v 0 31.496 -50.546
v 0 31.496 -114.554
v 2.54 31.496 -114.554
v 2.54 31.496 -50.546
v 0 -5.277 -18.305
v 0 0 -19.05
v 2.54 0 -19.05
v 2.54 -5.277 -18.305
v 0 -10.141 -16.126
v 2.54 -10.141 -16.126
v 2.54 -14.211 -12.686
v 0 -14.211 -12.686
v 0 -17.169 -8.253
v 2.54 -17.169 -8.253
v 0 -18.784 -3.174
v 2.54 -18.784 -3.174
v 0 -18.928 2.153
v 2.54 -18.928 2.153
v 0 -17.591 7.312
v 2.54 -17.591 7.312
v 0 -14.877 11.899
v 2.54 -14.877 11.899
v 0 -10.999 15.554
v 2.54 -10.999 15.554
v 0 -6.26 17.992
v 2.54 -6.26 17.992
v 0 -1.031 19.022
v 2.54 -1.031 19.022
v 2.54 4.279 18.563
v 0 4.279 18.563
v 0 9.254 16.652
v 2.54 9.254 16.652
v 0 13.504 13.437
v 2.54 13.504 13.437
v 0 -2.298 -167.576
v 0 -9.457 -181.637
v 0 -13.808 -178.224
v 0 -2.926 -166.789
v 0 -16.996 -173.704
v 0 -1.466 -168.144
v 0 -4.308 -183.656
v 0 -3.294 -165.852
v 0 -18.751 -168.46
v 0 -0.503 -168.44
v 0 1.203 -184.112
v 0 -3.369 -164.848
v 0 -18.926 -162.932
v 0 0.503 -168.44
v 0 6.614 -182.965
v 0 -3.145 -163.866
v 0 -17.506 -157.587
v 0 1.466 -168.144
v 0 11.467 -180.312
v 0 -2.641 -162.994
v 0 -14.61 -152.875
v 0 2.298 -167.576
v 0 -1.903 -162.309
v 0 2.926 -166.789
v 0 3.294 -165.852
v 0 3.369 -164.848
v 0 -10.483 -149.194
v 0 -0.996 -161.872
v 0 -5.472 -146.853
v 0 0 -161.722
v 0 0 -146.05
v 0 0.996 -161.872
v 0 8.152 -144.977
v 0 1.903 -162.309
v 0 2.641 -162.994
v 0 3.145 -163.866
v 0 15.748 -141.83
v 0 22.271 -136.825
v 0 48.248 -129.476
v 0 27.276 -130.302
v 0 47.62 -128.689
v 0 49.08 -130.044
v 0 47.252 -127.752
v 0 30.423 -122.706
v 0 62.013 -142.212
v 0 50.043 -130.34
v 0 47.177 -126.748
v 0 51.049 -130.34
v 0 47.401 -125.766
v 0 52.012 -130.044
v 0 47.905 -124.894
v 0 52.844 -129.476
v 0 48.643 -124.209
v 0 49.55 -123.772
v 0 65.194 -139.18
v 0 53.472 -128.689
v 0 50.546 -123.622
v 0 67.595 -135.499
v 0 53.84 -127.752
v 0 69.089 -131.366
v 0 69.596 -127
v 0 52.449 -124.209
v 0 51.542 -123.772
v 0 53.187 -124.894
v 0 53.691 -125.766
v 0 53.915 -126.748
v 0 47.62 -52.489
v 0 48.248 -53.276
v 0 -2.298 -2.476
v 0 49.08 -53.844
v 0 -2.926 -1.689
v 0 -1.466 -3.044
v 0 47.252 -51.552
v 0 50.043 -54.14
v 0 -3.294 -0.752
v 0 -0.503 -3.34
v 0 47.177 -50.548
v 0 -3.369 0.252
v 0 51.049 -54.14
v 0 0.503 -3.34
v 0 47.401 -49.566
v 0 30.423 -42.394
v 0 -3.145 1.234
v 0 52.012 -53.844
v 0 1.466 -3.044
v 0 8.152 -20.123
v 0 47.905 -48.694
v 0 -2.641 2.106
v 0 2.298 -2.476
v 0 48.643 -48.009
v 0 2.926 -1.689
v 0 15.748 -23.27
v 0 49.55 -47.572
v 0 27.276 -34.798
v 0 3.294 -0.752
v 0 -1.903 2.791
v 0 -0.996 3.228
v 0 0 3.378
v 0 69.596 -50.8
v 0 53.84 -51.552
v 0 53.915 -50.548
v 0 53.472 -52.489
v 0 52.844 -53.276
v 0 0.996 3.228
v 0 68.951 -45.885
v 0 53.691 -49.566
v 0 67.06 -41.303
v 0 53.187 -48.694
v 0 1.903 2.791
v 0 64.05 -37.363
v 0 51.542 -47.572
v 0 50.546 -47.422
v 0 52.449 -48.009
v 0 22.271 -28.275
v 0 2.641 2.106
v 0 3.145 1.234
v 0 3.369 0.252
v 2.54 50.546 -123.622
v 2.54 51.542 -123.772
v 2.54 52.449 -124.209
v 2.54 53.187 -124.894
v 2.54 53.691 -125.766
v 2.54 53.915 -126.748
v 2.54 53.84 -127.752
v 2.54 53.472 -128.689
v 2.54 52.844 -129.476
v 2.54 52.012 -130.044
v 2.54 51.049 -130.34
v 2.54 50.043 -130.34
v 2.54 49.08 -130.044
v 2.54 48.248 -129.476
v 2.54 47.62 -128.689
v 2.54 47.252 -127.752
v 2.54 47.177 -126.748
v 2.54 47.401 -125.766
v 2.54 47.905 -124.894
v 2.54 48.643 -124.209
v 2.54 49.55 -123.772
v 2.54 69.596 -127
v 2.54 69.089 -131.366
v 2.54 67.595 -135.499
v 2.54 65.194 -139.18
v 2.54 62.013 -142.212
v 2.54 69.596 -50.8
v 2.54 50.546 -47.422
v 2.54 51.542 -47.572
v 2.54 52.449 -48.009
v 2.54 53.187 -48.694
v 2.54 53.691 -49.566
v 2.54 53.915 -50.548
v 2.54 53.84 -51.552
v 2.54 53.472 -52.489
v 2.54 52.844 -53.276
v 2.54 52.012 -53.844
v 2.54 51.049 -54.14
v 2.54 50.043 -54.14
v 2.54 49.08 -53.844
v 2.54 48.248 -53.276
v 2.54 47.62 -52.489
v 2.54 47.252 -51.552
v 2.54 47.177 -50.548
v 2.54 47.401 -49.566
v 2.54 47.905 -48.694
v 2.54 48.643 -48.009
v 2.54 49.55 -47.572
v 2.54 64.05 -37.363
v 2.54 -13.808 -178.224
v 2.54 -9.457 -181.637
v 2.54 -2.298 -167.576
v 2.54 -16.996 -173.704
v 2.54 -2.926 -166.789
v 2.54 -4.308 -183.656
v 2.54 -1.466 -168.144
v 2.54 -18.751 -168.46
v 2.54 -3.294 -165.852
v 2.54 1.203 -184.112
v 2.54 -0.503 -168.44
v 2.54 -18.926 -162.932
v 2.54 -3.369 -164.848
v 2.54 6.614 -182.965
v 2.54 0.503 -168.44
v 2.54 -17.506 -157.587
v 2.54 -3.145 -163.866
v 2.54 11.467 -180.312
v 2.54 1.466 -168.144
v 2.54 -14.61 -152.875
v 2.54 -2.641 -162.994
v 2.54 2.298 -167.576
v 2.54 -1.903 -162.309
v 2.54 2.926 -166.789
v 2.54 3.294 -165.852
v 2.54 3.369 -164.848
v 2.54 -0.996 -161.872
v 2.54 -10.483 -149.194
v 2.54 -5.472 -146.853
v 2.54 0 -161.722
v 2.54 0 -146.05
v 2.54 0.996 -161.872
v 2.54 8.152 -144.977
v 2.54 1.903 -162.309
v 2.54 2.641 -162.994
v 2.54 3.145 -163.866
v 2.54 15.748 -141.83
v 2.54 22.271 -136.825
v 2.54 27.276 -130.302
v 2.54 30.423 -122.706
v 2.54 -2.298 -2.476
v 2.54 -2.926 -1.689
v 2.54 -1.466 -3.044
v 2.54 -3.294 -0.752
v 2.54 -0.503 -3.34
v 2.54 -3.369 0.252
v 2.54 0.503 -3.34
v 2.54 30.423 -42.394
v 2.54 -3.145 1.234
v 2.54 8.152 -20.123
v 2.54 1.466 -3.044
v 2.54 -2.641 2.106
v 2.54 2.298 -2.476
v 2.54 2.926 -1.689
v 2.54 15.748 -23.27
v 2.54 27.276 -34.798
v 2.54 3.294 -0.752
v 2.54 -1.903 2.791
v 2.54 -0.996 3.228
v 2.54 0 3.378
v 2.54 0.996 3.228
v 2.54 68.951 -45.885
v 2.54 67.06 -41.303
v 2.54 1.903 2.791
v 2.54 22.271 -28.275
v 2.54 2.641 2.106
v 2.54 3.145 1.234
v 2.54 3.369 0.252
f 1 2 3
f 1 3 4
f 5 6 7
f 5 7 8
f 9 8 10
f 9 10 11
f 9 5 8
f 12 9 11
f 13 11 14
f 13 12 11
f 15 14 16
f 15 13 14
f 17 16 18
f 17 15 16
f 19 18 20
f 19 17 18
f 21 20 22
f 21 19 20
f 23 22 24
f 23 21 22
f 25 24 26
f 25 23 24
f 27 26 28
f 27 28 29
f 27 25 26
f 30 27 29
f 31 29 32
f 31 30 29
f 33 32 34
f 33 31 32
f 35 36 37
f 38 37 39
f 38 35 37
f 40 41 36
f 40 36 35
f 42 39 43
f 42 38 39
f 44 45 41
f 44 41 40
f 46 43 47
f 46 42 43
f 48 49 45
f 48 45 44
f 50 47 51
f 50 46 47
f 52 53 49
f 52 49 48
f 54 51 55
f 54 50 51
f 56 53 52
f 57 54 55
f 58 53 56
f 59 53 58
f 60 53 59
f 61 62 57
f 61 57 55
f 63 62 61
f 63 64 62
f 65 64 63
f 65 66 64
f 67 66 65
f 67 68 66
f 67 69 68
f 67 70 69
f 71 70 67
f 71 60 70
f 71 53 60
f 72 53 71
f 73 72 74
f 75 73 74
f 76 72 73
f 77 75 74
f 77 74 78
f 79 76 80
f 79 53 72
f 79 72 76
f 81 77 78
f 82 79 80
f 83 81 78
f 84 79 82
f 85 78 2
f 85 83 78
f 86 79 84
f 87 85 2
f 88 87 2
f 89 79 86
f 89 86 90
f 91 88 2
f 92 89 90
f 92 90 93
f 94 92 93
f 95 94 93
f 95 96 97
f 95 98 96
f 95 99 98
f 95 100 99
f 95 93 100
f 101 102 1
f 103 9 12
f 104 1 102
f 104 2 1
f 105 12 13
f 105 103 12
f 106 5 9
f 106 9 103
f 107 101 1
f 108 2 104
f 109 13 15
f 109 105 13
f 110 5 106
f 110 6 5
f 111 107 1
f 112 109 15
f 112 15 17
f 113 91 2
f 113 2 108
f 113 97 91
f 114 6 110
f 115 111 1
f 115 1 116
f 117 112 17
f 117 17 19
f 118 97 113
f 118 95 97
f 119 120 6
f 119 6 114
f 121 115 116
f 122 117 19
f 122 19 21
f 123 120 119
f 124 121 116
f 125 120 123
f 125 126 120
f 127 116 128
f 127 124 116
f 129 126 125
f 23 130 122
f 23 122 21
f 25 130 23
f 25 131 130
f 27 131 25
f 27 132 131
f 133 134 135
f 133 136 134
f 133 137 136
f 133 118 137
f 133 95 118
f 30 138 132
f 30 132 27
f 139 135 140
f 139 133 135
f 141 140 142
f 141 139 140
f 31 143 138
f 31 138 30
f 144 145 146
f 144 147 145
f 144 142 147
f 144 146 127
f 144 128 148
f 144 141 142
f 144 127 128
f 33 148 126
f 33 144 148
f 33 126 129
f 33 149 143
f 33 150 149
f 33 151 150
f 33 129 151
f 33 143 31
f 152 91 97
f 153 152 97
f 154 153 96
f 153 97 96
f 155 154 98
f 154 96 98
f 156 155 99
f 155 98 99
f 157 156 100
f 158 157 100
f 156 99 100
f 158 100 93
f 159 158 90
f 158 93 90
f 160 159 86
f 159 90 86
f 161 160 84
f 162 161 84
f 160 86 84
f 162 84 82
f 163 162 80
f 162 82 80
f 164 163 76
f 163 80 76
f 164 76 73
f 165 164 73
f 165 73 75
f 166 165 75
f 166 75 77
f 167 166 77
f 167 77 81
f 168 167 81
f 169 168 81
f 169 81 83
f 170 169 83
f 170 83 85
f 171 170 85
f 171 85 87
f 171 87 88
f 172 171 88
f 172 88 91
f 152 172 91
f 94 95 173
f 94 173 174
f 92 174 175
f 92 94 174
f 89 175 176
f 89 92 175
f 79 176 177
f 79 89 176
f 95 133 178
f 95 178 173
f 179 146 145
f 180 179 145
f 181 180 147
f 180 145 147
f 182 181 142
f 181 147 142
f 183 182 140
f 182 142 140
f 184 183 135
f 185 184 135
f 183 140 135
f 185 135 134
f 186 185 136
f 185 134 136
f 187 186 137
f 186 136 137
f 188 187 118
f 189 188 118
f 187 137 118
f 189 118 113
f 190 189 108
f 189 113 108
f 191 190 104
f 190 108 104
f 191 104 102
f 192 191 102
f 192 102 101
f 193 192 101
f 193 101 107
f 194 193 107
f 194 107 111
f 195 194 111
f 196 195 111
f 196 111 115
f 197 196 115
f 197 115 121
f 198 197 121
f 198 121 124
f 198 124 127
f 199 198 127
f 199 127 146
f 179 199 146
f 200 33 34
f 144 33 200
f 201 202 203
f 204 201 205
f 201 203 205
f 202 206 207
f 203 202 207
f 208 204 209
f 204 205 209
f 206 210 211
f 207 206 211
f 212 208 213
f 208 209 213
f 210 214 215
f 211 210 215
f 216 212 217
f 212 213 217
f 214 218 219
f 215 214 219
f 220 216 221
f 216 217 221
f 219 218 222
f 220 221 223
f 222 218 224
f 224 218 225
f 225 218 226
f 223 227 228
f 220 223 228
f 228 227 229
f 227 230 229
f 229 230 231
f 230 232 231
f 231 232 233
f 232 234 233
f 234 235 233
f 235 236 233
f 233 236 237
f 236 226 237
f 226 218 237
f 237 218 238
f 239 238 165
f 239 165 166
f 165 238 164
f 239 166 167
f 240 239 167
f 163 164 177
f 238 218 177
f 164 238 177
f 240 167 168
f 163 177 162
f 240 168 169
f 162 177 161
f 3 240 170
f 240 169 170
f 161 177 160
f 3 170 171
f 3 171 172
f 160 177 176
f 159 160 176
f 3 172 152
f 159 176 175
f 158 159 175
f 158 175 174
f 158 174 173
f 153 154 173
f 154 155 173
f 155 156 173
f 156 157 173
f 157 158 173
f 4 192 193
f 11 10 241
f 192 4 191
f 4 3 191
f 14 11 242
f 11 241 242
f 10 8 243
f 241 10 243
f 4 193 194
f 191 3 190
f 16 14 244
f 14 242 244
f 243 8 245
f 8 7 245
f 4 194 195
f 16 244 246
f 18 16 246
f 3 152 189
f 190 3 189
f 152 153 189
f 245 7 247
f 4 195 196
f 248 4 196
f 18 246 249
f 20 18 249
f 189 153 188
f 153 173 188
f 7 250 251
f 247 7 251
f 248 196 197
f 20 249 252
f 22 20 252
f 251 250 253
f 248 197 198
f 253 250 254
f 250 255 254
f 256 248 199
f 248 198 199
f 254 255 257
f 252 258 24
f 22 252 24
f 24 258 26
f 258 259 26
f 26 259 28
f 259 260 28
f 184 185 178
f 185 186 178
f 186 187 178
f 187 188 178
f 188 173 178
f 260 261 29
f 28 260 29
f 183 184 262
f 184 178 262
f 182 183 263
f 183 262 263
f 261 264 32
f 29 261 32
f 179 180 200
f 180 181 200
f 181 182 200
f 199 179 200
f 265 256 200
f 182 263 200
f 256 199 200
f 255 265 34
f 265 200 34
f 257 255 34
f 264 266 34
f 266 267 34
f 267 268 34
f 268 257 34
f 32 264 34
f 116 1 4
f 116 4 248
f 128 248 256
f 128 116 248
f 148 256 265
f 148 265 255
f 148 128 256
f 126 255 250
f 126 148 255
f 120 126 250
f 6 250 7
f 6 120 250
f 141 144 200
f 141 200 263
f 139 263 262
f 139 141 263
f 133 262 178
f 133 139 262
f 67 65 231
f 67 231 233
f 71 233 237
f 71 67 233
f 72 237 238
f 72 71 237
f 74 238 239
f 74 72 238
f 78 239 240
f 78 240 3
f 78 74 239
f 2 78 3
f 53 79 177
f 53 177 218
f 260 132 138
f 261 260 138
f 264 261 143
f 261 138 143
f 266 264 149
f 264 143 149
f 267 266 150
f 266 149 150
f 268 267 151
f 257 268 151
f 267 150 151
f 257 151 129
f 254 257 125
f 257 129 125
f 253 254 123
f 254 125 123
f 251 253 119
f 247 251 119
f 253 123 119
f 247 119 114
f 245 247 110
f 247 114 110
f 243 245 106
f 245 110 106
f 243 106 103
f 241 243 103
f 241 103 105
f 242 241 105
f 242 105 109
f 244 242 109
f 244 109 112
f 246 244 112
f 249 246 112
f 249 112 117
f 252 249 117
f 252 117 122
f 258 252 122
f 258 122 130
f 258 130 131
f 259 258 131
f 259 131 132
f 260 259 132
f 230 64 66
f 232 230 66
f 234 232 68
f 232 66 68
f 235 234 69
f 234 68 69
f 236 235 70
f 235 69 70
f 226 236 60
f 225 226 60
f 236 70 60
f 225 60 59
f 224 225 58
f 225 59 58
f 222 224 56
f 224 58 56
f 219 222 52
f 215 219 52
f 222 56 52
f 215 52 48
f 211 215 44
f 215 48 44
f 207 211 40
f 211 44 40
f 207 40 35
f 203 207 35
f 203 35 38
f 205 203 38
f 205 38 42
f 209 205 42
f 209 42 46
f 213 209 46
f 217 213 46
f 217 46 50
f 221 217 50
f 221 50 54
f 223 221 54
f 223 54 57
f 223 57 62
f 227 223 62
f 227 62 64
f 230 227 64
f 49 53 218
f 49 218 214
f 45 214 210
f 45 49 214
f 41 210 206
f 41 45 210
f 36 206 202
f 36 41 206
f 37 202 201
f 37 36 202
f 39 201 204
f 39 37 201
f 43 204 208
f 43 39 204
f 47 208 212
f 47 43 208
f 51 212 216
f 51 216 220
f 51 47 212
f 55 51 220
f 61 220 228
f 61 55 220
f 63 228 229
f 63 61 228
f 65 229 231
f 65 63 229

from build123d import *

# Parameters (mm, degrees)
BOSS_EXTRUDE1_DEPTH     = 2.54
F_1_4_CLEARANCE_HOLE1_D = 6.7564


with BuildPart() as part:
    # Sketch1 → Boss-Extrude1 (new body)
    with BuildSketch(Plane(origin=(0, 0, 0), x_dir=(0, 0, -1), z_dir=(1, 0, 0))):
        with BuildLine():
            Line((-13.43658162, 13.504102131), (37.36341838, 64.050102131))
            ThreePointArc((37.36341838, 64.050102131), (43.531941304, 68.155026742), (50.8, 69.596))
            Line((50.8, 69.596), (127, 69.596))
            ThreePointArc((127, 69.596), (135.498900621, 67.595081742), (142.212435842, 62.012660183))
            Line((142.212435842, 62.012660183), (180.312435842, 11.466660183))
            ThreePointArc((180.312435842, 11.466660183), (171.145891051, -18.065151574), (146.05, 0))
            ThreePointArc((146.05, 0), (136.82503518, 22.27103518), (114.554, 31.496))
            Line((114.554, 31.496), (50.546, 31.496))
            ThreePointArc((50.546, 31.496), (28.27496482, 22.27103518), (19.05, 0))
            ThreePointArc((19.05, 0), (-7.31216863, -17.590755809), (-13.43658162, 13.504102131))
        make_face()
    extrude(amount=BOSS_EXTRUDE1_DEPTH)

    # 1/4 Clearance Hole1 (through all)
    with Locations(Plane(origin=(2.54, 0, 0), x_dir=(0, 0, -1), z_dir=(1, 0, 0))):
        with Locations((50.8, 50.546), (127, 50.546), (165.1, 0), (0, 0)):
            Hole(F_1_4_CLEARANCE_HOLE1_D / 2)


solid = part.part
